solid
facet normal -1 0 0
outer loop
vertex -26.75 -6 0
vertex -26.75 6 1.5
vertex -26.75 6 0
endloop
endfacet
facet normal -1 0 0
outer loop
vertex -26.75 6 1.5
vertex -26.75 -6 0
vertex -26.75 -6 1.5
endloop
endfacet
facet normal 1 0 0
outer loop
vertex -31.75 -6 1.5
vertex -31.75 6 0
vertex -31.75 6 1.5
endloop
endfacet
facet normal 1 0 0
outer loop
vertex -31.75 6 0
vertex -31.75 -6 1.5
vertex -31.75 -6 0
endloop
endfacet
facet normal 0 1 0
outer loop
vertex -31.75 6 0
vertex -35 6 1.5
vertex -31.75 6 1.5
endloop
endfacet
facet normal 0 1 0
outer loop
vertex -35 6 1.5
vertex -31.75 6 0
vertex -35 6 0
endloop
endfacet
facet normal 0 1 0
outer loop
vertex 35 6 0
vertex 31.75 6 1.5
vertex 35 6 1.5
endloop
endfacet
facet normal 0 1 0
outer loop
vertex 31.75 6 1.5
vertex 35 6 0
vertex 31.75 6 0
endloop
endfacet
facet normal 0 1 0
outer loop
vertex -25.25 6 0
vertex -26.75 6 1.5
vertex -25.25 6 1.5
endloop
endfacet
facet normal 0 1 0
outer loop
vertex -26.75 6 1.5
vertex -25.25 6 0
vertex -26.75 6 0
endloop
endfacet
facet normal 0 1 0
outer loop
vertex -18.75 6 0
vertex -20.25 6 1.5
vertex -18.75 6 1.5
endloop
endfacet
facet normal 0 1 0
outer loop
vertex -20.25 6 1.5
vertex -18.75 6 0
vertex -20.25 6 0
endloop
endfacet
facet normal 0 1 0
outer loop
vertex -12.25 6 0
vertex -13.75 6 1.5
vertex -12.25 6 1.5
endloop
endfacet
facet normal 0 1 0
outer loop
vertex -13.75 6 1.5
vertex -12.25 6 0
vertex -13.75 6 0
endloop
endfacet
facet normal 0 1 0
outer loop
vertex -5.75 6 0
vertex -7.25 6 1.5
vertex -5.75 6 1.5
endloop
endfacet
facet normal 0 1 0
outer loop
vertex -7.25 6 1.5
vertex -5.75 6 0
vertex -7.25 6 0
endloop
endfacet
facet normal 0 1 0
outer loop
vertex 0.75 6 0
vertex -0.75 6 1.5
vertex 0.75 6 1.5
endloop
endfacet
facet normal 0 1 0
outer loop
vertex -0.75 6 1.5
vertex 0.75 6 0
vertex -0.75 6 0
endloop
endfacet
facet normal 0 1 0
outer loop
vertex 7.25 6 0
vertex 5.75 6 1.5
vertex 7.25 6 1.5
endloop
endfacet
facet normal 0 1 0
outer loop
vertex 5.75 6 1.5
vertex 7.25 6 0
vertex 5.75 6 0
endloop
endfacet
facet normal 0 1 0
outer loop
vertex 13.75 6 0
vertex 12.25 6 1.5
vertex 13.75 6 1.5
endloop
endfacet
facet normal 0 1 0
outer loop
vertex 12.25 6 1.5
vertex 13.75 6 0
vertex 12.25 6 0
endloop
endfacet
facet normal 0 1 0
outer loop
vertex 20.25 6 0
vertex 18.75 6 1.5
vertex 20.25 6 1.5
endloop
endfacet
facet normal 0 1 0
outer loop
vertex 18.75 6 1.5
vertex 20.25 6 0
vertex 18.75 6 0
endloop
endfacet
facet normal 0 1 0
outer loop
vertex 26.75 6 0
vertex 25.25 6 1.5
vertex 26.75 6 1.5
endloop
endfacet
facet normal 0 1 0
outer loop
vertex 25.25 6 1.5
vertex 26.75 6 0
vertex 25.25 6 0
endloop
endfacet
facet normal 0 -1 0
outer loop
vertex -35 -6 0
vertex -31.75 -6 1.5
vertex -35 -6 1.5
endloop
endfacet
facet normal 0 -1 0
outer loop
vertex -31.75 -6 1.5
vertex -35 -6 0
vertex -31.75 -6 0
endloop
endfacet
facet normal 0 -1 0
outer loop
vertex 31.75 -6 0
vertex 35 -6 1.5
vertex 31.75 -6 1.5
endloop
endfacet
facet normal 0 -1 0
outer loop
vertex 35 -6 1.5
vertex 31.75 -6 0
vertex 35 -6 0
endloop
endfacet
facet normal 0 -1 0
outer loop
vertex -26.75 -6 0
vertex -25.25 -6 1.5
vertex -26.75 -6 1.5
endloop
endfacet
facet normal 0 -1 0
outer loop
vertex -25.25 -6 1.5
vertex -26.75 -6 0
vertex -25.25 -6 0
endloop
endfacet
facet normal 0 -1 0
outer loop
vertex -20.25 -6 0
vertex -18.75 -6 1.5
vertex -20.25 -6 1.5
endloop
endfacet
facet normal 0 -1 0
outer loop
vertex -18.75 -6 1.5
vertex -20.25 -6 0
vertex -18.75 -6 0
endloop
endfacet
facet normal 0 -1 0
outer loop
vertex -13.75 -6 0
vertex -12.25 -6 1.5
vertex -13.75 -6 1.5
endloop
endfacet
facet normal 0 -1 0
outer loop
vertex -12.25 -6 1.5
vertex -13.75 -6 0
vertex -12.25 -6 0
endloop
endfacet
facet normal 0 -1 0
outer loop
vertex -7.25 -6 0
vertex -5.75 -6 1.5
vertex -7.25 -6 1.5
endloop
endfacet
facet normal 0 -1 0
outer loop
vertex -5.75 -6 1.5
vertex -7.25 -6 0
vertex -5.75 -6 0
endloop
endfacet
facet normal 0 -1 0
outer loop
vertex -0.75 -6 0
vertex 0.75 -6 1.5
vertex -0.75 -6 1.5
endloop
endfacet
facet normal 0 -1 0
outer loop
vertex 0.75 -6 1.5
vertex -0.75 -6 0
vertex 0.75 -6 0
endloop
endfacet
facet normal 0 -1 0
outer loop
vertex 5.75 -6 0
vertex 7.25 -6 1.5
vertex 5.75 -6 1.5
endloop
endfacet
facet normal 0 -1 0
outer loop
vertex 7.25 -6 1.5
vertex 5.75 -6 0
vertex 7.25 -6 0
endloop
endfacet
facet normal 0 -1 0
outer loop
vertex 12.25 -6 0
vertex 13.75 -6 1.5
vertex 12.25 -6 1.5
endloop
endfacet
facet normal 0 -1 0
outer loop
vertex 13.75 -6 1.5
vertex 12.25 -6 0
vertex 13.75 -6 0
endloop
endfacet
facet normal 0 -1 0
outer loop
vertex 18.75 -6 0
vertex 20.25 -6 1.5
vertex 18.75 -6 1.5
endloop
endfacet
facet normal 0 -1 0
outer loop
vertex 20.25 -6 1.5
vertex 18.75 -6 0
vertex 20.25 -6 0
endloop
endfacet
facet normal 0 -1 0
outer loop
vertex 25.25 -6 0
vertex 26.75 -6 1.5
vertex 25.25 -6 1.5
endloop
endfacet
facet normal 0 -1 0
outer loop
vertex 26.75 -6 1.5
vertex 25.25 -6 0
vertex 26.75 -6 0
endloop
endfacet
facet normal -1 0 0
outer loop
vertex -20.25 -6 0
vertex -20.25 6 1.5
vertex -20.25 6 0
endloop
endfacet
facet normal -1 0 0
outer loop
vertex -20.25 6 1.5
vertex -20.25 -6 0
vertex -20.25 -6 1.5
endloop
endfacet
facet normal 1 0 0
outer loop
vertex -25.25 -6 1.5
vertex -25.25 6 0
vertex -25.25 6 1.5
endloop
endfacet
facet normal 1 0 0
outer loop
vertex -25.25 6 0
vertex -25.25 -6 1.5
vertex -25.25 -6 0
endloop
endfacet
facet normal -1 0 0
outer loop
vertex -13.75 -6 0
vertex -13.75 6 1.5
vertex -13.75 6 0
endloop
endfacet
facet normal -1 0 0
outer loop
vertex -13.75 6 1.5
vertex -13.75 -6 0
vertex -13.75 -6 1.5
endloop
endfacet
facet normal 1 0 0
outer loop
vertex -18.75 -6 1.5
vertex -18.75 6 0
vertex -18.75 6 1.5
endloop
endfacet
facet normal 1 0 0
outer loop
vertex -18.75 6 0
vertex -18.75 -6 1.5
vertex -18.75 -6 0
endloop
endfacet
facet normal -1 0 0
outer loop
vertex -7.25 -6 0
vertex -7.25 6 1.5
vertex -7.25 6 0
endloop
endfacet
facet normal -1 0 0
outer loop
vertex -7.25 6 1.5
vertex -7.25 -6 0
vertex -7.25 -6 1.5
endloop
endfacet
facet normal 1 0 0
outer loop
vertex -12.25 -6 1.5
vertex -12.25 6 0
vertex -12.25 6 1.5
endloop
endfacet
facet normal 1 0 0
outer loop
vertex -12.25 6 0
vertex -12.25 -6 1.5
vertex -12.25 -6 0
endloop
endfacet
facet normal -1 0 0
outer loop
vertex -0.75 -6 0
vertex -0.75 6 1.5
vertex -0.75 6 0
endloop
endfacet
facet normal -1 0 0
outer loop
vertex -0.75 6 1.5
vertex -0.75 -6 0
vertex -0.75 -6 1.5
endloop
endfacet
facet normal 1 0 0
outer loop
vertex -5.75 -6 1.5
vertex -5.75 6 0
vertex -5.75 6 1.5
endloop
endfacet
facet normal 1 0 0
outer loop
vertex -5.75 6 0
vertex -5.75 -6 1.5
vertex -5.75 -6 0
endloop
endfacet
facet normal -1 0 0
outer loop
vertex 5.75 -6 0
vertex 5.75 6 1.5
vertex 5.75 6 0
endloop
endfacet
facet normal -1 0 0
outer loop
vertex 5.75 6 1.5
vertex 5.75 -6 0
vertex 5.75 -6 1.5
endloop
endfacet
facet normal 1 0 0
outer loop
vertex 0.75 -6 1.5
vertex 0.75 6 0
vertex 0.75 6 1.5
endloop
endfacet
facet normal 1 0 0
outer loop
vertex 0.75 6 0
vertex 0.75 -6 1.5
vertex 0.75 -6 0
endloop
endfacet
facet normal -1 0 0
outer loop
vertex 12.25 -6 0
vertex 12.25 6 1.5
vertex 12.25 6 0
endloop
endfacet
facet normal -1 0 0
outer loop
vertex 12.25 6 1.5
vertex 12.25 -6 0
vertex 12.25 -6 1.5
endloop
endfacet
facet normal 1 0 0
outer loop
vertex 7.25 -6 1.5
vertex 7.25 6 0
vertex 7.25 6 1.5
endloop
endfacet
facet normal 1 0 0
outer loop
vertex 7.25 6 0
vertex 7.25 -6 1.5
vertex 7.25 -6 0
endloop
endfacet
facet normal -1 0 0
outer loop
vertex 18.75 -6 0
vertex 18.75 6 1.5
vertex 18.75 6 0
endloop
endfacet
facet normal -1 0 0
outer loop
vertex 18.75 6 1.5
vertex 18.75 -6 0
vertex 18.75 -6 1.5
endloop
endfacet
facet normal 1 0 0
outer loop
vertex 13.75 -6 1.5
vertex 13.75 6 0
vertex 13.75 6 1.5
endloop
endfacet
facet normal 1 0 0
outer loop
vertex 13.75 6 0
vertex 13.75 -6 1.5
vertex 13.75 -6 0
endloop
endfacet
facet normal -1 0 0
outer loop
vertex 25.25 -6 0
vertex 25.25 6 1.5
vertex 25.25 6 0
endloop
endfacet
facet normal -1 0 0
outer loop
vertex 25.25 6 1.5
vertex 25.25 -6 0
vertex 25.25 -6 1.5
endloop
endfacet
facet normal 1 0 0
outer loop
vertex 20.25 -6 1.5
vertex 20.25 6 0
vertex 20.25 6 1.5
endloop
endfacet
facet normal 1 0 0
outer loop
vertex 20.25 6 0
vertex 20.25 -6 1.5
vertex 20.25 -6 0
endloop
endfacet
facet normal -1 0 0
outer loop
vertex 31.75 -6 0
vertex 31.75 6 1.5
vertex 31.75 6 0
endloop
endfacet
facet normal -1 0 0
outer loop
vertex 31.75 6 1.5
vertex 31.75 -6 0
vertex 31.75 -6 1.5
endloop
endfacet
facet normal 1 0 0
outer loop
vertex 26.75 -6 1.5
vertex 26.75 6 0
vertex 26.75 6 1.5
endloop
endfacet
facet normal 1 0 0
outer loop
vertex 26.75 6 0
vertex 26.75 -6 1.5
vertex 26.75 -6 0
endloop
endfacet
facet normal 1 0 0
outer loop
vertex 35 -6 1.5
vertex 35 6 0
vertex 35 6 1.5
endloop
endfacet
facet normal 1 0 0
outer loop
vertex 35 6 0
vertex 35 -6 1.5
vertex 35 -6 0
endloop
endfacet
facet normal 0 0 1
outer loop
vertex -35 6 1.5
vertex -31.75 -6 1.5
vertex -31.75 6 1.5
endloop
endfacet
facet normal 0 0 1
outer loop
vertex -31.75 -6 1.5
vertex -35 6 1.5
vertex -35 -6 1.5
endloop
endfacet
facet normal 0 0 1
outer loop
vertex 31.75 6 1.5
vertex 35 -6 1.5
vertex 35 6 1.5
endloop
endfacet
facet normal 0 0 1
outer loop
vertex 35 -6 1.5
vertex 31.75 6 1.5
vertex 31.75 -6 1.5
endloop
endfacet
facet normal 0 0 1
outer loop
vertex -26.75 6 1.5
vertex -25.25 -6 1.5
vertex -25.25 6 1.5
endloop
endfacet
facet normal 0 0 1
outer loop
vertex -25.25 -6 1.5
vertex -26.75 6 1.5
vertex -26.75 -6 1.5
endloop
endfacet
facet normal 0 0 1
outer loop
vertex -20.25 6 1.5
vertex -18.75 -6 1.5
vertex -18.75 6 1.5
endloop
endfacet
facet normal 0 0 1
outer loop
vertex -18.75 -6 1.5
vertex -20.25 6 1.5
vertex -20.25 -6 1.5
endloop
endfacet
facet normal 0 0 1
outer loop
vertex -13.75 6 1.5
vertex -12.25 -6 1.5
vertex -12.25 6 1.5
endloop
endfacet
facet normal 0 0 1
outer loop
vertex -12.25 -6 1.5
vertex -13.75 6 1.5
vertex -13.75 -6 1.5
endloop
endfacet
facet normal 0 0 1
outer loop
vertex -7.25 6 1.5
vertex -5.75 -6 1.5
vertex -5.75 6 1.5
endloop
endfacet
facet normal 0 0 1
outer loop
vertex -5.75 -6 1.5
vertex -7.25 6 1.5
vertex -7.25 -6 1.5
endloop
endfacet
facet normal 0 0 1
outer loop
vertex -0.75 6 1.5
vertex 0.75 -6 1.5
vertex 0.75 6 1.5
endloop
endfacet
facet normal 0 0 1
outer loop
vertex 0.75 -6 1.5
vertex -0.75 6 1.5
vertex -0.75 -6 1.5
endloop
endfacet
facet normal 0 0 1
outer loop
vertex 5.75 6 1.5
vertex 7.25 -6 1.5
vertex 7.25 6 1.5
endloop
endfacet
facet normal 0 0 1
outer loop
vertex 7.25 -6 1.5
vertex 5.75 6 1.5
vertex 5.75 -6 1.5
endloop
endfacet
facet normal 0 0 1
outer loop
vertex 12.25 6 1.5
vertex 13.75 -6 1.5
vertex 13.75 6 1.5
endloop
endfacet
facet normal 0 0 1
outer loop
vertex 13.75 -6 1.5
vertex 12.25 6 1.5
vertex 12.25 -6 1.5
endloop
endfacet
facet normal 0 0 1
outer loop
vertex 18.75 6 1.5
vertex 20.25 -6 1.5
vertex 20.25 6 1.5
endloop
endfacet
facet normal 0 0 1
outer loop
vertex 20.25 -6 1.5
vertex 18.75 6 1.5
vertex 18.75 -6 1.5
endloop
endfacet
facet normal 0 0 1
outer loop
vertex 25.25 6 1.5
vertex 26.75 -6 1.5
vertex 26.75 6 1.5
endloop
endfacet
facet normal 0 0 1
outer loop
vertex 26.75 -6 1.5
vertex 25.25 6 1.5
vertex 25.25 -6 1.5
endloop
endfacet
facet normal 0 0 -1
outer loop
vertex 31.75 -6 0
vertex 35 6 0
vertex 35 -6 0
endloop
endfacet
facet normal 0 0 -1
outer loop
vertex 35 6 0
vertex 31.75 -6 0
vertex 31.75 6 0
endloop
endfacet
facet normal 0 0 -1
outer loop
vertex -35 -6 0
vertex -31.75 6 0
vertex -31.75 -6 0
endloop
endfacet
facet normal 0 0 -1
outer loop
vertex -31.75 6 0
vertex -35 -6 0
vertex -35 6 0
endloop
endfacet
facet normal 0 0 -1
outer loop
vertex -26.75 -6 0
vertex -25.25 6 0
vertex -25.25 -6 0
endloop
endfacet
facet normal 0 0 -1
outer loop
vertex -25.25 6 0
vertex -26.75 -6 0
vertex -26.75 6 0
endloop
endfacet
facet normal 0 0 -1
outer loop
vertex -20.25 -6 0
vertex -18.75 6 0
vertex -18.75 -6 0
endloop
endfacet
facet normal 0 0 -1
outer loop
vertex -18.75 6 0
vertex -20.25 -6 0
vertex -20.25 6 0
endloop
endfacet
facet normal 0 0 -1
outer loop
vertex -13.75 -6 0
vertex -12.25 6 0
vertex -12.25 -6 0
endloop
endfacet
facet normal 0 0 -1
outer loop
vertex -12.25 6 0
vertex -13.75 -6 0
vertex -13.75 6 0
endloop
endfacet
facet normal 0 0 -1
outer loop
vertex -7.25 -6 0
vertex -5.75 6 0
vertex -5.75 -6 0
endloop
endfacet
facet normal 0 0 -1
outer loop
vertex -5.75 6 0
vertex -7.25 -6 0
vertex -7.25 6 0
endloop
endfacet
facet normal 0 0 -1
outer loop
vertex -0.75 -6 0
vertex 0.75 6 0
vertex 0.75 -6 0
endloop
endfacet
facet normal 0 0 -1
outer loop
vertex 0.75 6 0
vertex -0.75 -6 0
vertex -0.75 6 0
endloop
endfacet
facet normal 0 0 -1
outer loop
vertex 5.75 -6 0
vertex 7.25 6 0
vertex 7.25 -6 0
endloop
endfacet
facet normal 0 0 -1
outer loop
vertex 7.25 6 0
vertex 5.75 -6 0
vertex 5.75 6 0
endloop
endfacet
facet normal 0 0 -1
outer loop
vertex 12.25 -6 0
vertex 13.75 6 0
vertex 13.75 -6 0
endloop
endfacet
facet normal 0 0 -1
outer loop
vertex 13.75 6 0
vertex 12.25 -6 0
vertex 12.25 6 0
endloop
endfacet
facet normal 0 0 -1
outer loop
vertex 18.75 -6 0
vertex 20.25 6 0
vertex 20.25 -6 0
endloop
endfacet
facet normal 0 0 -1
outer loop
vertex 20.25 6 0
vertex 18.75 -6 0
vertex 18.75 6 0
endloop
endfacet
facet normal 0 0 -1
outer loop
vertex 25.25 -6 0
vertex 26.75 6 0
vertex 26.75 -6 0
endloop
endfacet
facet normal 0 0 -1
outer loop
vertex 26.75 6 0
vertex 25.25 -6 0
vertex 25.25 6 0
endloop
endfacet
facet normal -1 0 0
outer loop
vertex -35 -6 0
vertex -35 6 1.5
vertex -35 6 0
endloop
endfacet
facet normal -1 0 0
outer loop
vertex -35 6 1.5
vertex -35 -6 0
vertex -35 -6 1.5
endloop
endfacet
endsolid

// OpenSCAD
// 10-well agarose comb, printed lying flat
// Units: mm

plate_t     = 1.5;   // plate thickness (Z)
spine_l     = 70;    // spine length (X)
spine_w     = 12;    // spine width (Y)
teeth_n     = 10;    // number of teeth
teeth_w     = 5;     // tooth width (X)
teeth_l     = 12;    // tooth length (Y)
teeth_gap   = 1.5;   // gap between teeth (X)
overcut     = 0.5;   // cutter overshoot past faces

$fn = 64;

pitch = teeth_w + teeth_gap;          // centre spacing
x0    = -(teeth_n - 1) * pitch / 2;   // first tooth centre

difference() {
    // Spine
    translate([-spine_l / 2, -spine_w / 2, 0])
        cube([spine_l, spine_w, plate_t]);

    // Teeth
    for (i = [0 : teeth_n - 1])
        translate([x0 + i * pitch - teeth_w / 2, -teeth_l / 2, -overcut])
            cube([teeth_w, teeth_l, plate_t + 2 * overcut]);
}
